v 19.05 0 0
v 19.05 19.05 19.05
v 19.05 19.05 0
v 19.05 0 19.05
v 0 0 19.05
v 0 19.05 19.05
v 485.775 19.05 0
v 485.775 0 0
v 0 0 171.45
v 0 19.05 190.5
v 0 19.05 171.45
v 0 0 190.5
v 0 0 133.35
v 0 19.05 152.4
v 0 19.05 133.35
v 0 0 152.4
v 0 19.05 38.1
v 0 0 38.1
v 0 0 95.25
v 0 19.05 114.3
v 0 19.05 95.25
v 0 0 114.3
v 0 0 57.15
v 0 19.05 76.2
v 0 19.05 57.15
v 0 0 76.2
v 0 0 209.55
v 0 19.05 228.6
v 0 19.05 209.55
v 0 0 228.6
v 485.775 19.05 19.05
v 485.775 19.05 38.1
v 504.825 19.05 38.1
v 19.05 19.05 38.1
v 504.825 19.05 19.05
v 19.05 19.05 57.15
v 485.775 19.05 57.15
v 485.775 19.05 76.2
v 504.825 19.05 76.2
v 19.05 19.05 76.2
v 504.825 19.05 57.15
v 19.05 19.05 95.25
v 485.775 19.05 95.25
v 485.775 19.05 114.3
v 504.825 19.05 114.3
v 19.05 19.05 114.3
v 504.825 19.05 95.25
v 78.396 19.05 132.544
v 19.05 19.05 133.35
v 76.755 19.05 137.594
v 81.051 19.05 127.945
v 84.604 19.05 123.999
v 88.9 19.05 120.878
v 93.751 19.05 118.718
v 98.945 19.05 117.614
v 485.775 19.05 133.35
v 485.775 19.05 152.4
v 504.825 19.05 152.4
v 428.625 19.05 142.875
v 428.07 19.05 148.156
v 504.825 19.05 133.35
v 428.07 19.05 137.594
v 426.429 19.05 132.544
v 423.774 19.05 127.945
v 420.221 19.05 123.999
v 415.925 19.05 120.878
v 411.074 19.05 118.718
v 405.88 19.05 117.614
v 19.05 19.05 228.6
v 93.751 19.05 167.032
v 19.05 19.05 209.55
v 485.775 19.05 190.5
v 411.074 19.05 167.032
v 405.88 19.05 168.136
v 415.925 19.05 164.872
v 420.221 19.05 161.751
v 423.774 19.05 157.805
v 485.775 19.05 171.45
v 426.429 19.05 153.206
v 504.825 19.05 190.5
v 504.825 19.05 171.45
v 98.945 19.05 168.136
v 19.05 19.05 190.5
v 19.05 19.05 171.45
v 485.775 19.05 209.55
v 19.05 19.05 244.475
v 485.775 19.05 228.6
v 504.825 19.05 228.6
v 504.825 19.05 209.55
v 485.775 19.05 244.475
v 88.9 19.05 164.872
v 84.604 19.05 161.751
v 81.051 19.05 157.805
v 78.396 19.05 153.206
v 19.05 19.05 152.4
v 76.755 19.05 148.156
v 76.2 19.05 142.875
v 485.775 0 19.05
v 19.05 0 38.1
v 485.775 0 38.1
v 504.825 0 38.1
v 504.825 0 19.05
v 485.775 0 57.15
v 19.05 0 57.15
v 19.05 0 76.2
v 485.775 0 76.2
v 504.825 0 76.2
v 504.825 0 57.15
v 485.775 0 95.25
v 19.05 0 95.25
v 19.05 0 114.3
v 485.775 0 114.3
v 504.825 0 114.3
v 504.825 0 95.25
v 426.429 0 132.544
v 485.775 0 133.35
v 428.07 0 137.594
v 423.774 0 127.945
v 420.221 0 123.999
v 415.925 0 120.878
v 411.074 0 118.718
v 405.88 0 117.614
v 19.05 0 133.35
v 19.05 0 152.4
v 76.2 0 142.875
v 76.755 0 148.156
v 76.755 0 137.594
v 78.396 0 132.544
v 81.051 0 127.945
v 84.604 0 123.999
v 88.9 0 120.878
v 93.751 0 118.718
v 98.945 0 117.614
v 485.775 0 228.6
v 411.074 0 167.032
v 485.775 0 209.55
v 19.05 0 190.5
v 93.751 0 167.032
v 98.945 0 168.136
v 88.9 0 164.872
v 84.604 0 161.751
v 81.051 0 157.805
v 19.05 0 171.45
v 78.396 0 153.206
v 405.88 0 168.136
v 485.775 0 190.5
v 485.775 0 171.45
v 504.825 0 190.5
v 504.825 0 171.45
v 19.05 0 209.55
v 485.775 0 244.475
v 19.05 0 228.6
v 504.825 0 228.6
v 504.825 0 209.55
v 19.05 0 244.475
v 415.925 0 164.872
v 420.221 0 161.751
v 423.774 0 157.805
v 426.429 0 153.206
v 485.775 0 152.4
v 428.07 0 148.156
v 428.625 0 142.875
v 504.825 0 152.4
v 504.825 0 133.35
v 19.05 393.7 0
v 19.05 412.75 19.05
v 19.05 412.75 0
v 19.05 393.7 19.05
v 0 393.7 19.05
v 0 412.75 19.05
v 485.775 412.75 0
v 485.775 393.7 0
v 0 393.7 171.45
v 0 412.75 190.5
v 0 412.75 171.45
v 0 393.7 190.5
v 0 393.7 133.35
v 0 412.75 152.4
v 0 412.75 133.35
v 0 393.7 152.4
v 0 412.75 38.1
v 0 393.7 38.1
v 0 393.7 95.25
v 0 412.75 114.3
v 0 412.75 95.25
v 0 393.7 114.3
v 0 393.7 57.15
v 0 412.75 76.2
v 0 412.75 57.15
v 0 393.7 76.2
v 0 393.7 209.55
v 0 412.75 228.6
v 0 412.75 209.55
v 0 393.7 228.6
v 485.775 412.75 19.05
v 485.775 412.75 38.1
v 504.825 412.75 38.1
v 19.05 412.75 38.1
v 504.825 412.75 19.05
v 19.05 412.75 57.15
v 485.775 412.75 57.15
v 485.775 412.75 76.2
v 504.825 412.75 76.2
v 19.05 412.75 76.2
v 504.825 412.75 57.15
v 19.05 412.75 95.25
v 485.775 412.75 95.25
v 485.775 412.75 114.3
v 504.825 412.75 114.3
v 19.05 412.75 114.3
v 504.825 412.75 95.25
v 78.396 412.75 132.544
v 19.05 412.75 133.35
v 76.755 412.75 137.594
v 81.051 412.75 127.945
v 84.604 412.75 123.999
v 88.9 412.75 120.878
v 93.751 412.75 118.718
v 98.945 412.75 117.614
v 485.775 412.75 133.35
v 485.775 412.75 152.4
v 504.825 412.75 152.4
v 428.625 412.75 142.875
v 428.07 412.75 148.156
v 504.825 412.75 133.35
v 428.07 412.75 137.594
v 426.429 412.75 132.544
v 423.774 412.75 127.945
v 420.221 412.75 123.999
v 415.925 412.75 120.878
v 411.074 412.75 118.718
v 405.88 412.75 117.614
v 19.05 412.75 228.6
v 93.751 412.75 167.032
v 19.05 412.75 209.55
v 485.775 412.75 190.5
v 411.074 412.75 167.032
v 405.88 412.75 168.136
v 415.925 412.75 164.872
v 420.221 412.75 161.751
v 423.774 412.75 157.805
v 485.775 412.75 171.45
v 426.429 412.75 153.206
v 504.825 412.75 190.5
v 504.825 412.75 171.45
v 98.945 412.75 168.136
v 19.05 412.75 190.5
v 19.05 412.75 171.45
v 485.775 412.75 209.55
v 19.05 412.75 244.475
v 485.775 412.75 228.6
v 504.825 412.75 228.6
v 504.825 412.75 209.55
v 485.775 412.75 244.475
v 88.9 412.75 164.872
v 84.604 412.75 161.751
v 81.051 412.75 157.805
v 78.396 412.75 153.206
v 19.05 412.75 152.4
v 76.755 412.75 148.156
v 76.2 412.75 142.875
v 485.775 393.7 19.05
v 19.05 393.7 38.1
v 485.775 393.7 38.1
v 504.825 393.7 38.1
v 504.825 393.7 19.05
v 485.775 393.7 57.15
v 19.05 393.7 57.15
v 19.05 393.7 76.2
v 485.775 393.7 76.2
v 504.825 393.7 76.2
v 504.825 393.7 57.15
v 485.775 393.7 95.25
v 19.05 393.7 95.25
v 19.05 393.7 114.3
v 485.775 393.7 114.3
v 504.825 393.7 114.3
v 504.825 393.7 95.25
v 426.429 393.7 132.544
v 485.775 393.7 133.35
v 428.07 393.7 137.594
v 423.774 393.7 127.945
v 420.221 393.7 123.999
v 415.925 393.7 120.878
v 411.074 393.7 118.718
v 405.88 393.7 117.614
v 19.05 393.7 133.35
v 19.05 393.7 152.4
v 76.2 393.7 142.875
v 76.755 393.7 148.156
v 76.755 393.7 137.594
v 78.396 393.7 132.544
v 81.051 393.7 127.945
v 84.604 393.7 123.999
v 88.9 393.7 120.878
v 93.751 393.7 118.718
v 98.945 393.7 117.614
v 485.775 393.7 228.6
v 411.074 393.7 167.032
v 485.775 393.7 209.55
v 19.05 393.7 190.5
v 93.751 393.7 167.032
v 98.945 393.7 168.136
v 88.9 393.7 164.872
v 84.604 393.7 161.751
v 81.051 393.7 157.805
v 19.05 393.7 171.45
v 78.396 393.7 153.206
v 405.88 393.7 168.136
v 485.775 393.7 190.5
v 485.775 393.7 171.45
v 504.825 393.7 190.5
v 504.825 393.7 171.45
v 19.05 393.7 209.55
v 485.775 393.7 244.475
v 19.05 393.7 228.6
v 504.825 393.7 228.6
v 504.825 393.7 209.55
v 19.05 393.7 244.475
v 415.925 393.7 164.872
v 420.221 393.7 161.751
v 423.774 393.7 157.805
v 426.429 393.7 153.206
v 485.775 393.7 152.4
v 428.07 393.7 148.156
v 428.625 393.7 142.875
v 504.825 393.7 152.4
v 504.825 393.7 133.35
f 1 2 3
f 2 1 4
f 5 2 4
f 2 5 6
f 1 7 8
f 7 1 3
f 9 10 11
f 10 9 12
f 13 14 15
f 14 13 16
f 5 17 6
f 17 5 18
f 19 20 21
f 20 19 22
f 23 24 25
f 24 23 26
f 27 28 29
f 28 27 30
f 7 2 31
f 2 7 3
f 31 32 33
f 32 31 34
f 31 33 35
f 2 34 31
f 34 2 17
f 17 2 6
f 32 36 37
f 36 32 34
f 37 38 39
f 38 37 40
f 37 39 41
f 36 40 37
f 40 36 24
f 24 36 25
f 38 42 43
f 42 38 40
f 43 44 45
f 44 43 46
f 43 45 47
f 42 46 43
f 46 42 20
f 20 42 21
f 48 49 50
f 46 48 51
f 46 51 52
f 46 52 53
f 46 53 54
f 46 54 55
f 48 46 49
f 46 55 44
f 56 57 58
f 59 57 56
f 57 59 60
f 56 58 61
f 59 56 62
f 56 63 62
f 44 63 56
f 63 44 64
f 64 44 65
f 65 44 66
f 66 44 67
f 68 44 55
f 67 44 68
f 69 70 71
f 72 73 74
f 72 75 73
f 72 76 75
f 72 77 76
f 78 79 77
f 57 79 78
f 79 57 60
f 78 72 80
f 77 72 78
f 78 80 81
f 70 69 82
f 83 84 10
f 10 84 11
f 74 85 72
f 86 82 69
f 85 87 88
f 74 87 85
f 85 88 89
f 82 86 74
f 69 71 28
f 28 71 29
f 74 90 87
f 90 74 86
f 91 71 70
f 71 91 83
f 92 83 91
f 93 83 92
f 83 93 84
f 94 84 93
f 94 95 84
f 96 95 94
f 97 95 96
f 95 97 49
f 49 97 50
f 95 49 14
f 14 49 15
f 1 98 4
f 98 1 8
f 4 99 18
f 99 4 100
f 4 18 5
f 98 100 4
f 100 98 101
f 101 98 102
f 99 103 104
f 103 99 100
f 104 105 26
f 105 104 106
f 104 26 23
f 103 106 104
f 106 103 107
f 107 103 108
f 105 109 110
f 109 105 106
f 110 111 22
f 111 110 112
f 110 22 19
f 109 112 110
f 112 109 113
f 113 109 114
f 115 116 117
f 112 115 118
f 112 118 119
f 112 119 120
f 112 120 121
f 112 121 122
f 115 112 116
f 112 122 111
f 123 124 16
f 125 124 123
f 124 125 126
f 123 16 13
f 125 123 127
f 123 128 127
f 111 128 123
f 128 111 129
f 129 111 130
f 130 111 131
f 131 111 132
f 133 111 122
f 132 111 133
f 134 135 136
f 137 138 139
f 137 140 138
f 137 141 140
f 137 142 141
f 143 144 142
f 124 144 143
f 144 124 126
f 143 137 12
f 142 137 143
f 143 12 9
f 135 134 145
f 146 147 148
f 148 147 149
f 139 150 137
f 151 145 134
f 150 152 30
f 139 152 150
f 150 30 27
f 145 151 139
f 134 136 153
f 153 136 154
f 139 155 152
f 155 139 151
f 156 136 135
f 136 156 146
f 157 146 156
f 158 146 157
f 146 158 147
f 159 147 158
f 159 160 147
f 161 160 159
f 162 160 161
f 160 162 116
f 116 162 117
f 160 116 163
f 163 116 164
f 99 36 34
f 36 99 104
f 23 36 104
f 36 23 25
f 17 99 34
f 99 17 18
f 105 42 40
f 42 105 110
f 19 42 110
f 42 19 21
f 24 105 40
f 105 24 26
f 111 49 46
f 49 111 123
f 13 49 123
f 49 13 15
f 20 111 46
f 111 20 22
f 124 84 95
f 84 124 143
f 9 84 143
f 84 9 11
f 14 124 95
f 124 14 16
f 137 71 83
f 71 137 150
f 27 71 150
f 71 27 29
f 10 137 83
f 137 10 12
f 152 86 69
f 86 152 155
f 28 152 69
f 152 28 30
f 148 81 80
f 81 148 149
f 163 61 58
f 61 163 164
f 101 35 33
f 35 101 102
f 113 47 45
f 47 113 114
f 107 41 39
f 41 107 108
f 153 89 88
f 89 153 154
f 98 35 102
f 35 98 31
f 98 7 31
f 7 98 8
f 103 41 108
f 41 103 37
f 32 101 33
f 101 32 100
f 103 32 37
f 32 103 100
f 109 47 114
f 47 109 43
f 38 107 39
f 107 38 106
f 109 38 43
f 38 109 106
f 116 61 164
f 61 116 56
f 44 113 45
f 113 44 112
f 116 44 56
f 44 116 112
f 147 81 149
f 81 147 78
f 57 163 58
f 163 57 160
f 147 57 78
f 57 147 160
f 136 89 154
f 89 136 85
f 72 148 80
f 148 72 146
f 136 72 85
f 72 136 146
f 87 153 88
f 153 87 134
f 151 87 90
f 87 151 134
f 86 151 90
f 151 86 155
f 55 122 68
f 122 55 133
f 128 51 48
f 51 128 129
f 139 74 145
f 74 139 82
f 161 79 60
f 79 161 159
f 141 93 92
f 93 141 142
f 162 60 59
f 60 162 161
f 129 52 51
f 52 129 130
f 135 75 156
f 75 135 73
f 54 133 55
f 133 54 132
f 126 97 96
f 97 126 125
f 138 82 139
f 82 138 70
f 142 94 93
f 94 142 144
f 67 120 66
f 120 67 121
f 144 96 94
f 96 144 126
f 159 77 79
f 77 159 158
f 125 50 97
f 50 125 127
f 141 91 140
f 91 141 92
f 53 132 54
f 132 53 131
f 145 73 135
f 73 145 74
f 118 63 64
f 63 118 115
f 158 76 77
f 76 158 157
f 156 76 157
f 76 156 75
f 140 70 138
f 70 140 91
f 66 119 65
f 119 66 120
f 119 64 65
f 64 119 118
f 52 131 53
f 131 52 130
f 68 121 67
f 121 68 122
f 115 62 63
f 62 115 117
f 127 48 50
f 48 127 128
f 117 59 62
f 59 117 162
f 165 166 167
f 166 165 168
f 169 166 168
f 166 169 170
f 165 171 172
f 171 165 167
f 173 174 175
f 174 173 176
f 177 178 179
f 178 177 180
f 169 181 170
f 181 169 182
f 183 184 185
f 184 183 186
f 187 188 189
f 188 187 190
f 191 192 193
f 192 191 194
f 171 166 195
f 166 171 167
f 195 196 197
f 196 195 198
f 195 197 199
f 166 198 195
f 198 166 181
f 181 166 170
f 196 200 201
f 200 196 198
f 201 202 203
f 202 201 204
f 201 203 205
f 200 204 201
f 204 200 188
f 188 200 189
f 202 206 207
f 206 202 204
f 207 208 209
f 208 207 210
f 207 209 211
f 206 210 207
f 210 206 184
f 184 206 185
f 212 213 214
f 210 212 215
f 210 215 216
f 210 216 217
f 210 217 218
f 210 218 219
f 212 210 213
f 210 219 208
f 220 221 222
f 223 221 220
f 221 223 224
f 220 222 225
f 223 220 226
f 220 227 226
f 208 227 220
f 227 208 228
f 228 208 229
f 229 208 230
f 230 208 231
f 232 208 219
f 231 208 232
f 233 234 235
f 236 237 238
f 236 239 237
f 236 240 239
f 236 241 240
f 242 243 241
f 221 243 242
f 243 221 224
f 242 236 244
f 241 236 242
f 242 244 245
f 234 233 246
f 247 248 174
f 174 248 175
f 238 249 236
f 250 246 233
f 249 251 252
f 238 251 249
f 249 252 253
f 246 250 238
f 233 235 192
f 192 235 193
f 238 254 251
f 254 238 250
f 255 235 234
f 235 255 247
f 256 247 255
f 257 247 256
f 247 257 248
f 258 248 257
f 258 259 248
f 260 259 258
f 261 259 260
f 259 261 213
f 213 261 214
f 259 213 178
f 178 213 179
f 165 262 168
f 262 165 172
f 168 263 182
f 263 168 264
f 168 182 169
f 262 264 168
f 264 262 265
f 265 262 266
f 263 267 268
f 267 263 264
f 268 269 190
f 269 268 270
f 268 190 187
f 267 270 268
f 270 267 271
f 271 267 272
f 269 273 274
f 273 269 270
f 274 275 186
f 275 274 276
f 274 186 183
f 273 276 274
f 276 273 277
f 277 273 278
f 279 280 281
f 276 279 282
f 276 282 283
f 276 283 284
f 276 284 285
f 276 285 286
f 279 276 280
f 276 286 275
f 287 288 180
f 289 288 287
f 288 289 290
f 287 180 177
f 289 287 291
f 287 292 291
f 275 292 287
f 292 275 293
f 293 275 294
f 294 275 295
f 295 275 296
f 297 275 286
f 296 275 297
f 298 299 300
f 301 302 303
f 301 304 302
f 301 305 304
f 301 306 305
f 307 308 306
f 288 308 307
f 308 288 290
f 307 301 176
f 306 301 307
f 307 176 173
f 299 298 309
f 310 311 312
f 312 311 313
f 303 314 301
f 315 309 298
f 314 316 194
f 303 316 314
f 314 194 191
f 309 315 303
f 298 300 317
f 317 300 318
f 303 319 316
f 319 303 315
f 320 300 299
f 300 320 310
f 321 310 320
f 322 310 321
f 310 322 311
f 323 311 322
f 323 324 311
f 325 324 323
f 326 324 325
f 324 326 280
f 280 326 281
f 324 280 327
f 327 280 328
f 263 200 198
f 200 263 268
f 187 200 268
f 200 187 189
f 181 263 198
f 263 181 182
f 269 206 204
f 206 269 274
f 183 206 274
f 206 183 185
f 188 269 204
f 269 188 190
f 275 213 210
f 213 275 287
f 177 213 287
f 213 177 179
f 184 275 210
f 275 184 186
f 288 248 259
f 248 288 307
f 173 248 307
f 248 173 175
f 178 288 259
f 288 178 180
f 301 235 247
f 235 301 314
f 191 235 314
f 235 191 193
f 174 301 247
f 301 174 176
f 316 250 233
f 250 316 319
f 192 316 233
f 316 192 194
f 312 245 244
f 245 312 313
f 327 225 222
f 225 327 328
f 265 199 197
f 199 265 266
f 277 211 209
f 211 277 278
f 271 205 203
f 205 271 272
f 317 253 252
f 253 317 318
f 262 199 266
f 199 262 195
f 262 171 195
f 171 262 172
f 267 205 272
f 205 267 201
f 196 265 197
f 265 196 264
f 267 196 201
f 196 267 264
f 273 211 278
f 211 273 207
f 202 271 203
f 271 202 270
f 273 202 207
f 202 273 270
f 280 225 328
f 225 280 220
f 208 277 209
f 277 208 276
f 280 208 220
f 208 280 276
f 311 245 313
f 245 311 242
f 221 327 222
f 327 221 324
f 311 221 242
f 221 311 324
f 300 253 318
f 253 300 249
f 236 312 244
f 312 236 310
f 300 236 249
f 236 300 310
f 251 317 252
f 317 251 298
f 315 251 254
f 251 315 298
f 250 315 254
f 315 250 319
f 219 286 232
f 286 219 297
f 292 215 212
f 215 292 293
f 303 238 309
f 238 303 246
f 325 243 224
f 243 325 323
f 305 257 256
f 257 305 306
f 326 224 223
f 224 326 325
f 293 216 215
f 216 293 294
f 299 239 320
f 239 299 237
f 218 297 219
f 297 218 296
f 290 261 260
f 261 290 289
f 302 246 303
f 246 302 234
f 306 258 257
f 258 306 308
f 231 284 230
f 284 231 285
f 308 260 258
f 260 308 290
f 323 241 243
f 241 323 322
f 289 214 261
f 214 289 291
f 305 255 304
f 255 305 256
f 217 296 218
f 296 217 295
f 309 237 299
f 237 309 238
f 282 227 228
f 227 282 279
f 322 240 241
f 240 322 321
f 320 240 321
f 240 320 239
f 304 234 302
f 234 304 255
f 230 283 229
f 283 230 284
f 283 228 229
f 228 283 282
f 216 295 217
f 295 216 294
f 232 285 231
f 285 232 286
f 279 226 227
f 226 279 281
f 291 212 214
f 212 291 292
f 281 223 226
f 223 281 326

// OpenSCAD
/**
    This is a cnc-able langstroth hive (currently only the Deep Hive Body)
    To use this, scroll to the bottom and then uncomment the projection lines individually, and then use openSCAD to generate dxfs.
    
    The handle holes are intended to be pockets cut into the boards.
    
    Copyright (C) 2018 Phillip Showers
    This model is released under the Creative Commons Attribution/Share Alike license.
    Attribute me if you use it. 
    Share it like I shared it.
    https://creativecommons.org/licenses/by-sa/4.0/

    Feel free to make money on it! If you want, donate some to www.fsf.org.
    
**/

in2mm=25.4;

beehiveDimensions = [(19+7/8)*in2mm, 16.25*in2mm, (9+5/8)*in2mm];
woodWidth = .75*in2mm;
frameRestHeight = 5/8*in2mm;

module handleSide(){
    difference()
    {
        cube([woodWidth, beehiveDimensions.y, beehiveDimensions.z]);
        //slots
        for (zOffset =[woodWidth:woodWidth*2:beehiveDimensions.z])
            translate([0,0,zOffset])
                cube([woodWidth,woodWidth,woodWidth]);
        //slots
        for (zOffset =[woodWidth:woodWidth*2:beehiveDimensions.z])
            translate([0,beehiveDimensions.y-woodWidth,zOffset])
                cube([woodWidth,woodWidth,woodWidth]);
        
        translate([woodWidth/2,0,beehiveDimensions.z-frameRestHeight])
            cube([woodWidth/2, beehiveDimensions.y, frameRestHeight]);
    }    
}

module hiveFront(){
    difference()
    {
        cube([beehiveDimensions.x, woodWidth, beehiveDimensions.z]);
        for (zOffset =[0:woodWidth*2:beehiveDimensions.z])
            translate([0,0,zOffset])
                cube([woodWidth,woodWidth,woodWidth]);
        for (zOffset =[0:woodWidth*2:beehiveDimensions.z])
            translate([beehiveDimensions.x-woodWidth,0,zOffset])
                cube([woodWidth,woodWidth,woodWidth]);
        
        //handle holes
        hull()
        {
            translate([4*in2mm,woodWidth,beehiveDimensions.z-4*in2mm])
                rotate([90,0,0])    
                    cylinder(r1=in2mm,r2=in2mm, h=woodWidth);
            translate([beehiveDimensions.x-4*in2mm,woodWidth,beehiveDimensions.z-4*in2mm])
                rotate([90,0,0])    
                    cylinder(r1=in2mm,r2=in2mm, h=woodWidth);
        }
    }
}

module beehive(){
    //translate([woodWidth,beehiveDimensions.y,0])rotate([0,0,180])handleSide();
    //translate([beehiveDimensions.x-woodWidth,0,0])handleSide();
    hiveFront();
    translate([0,beehiveDimensions.y-woodWidth,0])
        hiveFront();
}


//handleSide();

beehive();
//projection(cut=false)translate([beehiveDimensions.z,0,0])rotate([0,-90,0])handleSide();
//projection(cut=false)translate([beehiveDimensions.z,0,0])rotate([-90,0,90])hiveFront();
